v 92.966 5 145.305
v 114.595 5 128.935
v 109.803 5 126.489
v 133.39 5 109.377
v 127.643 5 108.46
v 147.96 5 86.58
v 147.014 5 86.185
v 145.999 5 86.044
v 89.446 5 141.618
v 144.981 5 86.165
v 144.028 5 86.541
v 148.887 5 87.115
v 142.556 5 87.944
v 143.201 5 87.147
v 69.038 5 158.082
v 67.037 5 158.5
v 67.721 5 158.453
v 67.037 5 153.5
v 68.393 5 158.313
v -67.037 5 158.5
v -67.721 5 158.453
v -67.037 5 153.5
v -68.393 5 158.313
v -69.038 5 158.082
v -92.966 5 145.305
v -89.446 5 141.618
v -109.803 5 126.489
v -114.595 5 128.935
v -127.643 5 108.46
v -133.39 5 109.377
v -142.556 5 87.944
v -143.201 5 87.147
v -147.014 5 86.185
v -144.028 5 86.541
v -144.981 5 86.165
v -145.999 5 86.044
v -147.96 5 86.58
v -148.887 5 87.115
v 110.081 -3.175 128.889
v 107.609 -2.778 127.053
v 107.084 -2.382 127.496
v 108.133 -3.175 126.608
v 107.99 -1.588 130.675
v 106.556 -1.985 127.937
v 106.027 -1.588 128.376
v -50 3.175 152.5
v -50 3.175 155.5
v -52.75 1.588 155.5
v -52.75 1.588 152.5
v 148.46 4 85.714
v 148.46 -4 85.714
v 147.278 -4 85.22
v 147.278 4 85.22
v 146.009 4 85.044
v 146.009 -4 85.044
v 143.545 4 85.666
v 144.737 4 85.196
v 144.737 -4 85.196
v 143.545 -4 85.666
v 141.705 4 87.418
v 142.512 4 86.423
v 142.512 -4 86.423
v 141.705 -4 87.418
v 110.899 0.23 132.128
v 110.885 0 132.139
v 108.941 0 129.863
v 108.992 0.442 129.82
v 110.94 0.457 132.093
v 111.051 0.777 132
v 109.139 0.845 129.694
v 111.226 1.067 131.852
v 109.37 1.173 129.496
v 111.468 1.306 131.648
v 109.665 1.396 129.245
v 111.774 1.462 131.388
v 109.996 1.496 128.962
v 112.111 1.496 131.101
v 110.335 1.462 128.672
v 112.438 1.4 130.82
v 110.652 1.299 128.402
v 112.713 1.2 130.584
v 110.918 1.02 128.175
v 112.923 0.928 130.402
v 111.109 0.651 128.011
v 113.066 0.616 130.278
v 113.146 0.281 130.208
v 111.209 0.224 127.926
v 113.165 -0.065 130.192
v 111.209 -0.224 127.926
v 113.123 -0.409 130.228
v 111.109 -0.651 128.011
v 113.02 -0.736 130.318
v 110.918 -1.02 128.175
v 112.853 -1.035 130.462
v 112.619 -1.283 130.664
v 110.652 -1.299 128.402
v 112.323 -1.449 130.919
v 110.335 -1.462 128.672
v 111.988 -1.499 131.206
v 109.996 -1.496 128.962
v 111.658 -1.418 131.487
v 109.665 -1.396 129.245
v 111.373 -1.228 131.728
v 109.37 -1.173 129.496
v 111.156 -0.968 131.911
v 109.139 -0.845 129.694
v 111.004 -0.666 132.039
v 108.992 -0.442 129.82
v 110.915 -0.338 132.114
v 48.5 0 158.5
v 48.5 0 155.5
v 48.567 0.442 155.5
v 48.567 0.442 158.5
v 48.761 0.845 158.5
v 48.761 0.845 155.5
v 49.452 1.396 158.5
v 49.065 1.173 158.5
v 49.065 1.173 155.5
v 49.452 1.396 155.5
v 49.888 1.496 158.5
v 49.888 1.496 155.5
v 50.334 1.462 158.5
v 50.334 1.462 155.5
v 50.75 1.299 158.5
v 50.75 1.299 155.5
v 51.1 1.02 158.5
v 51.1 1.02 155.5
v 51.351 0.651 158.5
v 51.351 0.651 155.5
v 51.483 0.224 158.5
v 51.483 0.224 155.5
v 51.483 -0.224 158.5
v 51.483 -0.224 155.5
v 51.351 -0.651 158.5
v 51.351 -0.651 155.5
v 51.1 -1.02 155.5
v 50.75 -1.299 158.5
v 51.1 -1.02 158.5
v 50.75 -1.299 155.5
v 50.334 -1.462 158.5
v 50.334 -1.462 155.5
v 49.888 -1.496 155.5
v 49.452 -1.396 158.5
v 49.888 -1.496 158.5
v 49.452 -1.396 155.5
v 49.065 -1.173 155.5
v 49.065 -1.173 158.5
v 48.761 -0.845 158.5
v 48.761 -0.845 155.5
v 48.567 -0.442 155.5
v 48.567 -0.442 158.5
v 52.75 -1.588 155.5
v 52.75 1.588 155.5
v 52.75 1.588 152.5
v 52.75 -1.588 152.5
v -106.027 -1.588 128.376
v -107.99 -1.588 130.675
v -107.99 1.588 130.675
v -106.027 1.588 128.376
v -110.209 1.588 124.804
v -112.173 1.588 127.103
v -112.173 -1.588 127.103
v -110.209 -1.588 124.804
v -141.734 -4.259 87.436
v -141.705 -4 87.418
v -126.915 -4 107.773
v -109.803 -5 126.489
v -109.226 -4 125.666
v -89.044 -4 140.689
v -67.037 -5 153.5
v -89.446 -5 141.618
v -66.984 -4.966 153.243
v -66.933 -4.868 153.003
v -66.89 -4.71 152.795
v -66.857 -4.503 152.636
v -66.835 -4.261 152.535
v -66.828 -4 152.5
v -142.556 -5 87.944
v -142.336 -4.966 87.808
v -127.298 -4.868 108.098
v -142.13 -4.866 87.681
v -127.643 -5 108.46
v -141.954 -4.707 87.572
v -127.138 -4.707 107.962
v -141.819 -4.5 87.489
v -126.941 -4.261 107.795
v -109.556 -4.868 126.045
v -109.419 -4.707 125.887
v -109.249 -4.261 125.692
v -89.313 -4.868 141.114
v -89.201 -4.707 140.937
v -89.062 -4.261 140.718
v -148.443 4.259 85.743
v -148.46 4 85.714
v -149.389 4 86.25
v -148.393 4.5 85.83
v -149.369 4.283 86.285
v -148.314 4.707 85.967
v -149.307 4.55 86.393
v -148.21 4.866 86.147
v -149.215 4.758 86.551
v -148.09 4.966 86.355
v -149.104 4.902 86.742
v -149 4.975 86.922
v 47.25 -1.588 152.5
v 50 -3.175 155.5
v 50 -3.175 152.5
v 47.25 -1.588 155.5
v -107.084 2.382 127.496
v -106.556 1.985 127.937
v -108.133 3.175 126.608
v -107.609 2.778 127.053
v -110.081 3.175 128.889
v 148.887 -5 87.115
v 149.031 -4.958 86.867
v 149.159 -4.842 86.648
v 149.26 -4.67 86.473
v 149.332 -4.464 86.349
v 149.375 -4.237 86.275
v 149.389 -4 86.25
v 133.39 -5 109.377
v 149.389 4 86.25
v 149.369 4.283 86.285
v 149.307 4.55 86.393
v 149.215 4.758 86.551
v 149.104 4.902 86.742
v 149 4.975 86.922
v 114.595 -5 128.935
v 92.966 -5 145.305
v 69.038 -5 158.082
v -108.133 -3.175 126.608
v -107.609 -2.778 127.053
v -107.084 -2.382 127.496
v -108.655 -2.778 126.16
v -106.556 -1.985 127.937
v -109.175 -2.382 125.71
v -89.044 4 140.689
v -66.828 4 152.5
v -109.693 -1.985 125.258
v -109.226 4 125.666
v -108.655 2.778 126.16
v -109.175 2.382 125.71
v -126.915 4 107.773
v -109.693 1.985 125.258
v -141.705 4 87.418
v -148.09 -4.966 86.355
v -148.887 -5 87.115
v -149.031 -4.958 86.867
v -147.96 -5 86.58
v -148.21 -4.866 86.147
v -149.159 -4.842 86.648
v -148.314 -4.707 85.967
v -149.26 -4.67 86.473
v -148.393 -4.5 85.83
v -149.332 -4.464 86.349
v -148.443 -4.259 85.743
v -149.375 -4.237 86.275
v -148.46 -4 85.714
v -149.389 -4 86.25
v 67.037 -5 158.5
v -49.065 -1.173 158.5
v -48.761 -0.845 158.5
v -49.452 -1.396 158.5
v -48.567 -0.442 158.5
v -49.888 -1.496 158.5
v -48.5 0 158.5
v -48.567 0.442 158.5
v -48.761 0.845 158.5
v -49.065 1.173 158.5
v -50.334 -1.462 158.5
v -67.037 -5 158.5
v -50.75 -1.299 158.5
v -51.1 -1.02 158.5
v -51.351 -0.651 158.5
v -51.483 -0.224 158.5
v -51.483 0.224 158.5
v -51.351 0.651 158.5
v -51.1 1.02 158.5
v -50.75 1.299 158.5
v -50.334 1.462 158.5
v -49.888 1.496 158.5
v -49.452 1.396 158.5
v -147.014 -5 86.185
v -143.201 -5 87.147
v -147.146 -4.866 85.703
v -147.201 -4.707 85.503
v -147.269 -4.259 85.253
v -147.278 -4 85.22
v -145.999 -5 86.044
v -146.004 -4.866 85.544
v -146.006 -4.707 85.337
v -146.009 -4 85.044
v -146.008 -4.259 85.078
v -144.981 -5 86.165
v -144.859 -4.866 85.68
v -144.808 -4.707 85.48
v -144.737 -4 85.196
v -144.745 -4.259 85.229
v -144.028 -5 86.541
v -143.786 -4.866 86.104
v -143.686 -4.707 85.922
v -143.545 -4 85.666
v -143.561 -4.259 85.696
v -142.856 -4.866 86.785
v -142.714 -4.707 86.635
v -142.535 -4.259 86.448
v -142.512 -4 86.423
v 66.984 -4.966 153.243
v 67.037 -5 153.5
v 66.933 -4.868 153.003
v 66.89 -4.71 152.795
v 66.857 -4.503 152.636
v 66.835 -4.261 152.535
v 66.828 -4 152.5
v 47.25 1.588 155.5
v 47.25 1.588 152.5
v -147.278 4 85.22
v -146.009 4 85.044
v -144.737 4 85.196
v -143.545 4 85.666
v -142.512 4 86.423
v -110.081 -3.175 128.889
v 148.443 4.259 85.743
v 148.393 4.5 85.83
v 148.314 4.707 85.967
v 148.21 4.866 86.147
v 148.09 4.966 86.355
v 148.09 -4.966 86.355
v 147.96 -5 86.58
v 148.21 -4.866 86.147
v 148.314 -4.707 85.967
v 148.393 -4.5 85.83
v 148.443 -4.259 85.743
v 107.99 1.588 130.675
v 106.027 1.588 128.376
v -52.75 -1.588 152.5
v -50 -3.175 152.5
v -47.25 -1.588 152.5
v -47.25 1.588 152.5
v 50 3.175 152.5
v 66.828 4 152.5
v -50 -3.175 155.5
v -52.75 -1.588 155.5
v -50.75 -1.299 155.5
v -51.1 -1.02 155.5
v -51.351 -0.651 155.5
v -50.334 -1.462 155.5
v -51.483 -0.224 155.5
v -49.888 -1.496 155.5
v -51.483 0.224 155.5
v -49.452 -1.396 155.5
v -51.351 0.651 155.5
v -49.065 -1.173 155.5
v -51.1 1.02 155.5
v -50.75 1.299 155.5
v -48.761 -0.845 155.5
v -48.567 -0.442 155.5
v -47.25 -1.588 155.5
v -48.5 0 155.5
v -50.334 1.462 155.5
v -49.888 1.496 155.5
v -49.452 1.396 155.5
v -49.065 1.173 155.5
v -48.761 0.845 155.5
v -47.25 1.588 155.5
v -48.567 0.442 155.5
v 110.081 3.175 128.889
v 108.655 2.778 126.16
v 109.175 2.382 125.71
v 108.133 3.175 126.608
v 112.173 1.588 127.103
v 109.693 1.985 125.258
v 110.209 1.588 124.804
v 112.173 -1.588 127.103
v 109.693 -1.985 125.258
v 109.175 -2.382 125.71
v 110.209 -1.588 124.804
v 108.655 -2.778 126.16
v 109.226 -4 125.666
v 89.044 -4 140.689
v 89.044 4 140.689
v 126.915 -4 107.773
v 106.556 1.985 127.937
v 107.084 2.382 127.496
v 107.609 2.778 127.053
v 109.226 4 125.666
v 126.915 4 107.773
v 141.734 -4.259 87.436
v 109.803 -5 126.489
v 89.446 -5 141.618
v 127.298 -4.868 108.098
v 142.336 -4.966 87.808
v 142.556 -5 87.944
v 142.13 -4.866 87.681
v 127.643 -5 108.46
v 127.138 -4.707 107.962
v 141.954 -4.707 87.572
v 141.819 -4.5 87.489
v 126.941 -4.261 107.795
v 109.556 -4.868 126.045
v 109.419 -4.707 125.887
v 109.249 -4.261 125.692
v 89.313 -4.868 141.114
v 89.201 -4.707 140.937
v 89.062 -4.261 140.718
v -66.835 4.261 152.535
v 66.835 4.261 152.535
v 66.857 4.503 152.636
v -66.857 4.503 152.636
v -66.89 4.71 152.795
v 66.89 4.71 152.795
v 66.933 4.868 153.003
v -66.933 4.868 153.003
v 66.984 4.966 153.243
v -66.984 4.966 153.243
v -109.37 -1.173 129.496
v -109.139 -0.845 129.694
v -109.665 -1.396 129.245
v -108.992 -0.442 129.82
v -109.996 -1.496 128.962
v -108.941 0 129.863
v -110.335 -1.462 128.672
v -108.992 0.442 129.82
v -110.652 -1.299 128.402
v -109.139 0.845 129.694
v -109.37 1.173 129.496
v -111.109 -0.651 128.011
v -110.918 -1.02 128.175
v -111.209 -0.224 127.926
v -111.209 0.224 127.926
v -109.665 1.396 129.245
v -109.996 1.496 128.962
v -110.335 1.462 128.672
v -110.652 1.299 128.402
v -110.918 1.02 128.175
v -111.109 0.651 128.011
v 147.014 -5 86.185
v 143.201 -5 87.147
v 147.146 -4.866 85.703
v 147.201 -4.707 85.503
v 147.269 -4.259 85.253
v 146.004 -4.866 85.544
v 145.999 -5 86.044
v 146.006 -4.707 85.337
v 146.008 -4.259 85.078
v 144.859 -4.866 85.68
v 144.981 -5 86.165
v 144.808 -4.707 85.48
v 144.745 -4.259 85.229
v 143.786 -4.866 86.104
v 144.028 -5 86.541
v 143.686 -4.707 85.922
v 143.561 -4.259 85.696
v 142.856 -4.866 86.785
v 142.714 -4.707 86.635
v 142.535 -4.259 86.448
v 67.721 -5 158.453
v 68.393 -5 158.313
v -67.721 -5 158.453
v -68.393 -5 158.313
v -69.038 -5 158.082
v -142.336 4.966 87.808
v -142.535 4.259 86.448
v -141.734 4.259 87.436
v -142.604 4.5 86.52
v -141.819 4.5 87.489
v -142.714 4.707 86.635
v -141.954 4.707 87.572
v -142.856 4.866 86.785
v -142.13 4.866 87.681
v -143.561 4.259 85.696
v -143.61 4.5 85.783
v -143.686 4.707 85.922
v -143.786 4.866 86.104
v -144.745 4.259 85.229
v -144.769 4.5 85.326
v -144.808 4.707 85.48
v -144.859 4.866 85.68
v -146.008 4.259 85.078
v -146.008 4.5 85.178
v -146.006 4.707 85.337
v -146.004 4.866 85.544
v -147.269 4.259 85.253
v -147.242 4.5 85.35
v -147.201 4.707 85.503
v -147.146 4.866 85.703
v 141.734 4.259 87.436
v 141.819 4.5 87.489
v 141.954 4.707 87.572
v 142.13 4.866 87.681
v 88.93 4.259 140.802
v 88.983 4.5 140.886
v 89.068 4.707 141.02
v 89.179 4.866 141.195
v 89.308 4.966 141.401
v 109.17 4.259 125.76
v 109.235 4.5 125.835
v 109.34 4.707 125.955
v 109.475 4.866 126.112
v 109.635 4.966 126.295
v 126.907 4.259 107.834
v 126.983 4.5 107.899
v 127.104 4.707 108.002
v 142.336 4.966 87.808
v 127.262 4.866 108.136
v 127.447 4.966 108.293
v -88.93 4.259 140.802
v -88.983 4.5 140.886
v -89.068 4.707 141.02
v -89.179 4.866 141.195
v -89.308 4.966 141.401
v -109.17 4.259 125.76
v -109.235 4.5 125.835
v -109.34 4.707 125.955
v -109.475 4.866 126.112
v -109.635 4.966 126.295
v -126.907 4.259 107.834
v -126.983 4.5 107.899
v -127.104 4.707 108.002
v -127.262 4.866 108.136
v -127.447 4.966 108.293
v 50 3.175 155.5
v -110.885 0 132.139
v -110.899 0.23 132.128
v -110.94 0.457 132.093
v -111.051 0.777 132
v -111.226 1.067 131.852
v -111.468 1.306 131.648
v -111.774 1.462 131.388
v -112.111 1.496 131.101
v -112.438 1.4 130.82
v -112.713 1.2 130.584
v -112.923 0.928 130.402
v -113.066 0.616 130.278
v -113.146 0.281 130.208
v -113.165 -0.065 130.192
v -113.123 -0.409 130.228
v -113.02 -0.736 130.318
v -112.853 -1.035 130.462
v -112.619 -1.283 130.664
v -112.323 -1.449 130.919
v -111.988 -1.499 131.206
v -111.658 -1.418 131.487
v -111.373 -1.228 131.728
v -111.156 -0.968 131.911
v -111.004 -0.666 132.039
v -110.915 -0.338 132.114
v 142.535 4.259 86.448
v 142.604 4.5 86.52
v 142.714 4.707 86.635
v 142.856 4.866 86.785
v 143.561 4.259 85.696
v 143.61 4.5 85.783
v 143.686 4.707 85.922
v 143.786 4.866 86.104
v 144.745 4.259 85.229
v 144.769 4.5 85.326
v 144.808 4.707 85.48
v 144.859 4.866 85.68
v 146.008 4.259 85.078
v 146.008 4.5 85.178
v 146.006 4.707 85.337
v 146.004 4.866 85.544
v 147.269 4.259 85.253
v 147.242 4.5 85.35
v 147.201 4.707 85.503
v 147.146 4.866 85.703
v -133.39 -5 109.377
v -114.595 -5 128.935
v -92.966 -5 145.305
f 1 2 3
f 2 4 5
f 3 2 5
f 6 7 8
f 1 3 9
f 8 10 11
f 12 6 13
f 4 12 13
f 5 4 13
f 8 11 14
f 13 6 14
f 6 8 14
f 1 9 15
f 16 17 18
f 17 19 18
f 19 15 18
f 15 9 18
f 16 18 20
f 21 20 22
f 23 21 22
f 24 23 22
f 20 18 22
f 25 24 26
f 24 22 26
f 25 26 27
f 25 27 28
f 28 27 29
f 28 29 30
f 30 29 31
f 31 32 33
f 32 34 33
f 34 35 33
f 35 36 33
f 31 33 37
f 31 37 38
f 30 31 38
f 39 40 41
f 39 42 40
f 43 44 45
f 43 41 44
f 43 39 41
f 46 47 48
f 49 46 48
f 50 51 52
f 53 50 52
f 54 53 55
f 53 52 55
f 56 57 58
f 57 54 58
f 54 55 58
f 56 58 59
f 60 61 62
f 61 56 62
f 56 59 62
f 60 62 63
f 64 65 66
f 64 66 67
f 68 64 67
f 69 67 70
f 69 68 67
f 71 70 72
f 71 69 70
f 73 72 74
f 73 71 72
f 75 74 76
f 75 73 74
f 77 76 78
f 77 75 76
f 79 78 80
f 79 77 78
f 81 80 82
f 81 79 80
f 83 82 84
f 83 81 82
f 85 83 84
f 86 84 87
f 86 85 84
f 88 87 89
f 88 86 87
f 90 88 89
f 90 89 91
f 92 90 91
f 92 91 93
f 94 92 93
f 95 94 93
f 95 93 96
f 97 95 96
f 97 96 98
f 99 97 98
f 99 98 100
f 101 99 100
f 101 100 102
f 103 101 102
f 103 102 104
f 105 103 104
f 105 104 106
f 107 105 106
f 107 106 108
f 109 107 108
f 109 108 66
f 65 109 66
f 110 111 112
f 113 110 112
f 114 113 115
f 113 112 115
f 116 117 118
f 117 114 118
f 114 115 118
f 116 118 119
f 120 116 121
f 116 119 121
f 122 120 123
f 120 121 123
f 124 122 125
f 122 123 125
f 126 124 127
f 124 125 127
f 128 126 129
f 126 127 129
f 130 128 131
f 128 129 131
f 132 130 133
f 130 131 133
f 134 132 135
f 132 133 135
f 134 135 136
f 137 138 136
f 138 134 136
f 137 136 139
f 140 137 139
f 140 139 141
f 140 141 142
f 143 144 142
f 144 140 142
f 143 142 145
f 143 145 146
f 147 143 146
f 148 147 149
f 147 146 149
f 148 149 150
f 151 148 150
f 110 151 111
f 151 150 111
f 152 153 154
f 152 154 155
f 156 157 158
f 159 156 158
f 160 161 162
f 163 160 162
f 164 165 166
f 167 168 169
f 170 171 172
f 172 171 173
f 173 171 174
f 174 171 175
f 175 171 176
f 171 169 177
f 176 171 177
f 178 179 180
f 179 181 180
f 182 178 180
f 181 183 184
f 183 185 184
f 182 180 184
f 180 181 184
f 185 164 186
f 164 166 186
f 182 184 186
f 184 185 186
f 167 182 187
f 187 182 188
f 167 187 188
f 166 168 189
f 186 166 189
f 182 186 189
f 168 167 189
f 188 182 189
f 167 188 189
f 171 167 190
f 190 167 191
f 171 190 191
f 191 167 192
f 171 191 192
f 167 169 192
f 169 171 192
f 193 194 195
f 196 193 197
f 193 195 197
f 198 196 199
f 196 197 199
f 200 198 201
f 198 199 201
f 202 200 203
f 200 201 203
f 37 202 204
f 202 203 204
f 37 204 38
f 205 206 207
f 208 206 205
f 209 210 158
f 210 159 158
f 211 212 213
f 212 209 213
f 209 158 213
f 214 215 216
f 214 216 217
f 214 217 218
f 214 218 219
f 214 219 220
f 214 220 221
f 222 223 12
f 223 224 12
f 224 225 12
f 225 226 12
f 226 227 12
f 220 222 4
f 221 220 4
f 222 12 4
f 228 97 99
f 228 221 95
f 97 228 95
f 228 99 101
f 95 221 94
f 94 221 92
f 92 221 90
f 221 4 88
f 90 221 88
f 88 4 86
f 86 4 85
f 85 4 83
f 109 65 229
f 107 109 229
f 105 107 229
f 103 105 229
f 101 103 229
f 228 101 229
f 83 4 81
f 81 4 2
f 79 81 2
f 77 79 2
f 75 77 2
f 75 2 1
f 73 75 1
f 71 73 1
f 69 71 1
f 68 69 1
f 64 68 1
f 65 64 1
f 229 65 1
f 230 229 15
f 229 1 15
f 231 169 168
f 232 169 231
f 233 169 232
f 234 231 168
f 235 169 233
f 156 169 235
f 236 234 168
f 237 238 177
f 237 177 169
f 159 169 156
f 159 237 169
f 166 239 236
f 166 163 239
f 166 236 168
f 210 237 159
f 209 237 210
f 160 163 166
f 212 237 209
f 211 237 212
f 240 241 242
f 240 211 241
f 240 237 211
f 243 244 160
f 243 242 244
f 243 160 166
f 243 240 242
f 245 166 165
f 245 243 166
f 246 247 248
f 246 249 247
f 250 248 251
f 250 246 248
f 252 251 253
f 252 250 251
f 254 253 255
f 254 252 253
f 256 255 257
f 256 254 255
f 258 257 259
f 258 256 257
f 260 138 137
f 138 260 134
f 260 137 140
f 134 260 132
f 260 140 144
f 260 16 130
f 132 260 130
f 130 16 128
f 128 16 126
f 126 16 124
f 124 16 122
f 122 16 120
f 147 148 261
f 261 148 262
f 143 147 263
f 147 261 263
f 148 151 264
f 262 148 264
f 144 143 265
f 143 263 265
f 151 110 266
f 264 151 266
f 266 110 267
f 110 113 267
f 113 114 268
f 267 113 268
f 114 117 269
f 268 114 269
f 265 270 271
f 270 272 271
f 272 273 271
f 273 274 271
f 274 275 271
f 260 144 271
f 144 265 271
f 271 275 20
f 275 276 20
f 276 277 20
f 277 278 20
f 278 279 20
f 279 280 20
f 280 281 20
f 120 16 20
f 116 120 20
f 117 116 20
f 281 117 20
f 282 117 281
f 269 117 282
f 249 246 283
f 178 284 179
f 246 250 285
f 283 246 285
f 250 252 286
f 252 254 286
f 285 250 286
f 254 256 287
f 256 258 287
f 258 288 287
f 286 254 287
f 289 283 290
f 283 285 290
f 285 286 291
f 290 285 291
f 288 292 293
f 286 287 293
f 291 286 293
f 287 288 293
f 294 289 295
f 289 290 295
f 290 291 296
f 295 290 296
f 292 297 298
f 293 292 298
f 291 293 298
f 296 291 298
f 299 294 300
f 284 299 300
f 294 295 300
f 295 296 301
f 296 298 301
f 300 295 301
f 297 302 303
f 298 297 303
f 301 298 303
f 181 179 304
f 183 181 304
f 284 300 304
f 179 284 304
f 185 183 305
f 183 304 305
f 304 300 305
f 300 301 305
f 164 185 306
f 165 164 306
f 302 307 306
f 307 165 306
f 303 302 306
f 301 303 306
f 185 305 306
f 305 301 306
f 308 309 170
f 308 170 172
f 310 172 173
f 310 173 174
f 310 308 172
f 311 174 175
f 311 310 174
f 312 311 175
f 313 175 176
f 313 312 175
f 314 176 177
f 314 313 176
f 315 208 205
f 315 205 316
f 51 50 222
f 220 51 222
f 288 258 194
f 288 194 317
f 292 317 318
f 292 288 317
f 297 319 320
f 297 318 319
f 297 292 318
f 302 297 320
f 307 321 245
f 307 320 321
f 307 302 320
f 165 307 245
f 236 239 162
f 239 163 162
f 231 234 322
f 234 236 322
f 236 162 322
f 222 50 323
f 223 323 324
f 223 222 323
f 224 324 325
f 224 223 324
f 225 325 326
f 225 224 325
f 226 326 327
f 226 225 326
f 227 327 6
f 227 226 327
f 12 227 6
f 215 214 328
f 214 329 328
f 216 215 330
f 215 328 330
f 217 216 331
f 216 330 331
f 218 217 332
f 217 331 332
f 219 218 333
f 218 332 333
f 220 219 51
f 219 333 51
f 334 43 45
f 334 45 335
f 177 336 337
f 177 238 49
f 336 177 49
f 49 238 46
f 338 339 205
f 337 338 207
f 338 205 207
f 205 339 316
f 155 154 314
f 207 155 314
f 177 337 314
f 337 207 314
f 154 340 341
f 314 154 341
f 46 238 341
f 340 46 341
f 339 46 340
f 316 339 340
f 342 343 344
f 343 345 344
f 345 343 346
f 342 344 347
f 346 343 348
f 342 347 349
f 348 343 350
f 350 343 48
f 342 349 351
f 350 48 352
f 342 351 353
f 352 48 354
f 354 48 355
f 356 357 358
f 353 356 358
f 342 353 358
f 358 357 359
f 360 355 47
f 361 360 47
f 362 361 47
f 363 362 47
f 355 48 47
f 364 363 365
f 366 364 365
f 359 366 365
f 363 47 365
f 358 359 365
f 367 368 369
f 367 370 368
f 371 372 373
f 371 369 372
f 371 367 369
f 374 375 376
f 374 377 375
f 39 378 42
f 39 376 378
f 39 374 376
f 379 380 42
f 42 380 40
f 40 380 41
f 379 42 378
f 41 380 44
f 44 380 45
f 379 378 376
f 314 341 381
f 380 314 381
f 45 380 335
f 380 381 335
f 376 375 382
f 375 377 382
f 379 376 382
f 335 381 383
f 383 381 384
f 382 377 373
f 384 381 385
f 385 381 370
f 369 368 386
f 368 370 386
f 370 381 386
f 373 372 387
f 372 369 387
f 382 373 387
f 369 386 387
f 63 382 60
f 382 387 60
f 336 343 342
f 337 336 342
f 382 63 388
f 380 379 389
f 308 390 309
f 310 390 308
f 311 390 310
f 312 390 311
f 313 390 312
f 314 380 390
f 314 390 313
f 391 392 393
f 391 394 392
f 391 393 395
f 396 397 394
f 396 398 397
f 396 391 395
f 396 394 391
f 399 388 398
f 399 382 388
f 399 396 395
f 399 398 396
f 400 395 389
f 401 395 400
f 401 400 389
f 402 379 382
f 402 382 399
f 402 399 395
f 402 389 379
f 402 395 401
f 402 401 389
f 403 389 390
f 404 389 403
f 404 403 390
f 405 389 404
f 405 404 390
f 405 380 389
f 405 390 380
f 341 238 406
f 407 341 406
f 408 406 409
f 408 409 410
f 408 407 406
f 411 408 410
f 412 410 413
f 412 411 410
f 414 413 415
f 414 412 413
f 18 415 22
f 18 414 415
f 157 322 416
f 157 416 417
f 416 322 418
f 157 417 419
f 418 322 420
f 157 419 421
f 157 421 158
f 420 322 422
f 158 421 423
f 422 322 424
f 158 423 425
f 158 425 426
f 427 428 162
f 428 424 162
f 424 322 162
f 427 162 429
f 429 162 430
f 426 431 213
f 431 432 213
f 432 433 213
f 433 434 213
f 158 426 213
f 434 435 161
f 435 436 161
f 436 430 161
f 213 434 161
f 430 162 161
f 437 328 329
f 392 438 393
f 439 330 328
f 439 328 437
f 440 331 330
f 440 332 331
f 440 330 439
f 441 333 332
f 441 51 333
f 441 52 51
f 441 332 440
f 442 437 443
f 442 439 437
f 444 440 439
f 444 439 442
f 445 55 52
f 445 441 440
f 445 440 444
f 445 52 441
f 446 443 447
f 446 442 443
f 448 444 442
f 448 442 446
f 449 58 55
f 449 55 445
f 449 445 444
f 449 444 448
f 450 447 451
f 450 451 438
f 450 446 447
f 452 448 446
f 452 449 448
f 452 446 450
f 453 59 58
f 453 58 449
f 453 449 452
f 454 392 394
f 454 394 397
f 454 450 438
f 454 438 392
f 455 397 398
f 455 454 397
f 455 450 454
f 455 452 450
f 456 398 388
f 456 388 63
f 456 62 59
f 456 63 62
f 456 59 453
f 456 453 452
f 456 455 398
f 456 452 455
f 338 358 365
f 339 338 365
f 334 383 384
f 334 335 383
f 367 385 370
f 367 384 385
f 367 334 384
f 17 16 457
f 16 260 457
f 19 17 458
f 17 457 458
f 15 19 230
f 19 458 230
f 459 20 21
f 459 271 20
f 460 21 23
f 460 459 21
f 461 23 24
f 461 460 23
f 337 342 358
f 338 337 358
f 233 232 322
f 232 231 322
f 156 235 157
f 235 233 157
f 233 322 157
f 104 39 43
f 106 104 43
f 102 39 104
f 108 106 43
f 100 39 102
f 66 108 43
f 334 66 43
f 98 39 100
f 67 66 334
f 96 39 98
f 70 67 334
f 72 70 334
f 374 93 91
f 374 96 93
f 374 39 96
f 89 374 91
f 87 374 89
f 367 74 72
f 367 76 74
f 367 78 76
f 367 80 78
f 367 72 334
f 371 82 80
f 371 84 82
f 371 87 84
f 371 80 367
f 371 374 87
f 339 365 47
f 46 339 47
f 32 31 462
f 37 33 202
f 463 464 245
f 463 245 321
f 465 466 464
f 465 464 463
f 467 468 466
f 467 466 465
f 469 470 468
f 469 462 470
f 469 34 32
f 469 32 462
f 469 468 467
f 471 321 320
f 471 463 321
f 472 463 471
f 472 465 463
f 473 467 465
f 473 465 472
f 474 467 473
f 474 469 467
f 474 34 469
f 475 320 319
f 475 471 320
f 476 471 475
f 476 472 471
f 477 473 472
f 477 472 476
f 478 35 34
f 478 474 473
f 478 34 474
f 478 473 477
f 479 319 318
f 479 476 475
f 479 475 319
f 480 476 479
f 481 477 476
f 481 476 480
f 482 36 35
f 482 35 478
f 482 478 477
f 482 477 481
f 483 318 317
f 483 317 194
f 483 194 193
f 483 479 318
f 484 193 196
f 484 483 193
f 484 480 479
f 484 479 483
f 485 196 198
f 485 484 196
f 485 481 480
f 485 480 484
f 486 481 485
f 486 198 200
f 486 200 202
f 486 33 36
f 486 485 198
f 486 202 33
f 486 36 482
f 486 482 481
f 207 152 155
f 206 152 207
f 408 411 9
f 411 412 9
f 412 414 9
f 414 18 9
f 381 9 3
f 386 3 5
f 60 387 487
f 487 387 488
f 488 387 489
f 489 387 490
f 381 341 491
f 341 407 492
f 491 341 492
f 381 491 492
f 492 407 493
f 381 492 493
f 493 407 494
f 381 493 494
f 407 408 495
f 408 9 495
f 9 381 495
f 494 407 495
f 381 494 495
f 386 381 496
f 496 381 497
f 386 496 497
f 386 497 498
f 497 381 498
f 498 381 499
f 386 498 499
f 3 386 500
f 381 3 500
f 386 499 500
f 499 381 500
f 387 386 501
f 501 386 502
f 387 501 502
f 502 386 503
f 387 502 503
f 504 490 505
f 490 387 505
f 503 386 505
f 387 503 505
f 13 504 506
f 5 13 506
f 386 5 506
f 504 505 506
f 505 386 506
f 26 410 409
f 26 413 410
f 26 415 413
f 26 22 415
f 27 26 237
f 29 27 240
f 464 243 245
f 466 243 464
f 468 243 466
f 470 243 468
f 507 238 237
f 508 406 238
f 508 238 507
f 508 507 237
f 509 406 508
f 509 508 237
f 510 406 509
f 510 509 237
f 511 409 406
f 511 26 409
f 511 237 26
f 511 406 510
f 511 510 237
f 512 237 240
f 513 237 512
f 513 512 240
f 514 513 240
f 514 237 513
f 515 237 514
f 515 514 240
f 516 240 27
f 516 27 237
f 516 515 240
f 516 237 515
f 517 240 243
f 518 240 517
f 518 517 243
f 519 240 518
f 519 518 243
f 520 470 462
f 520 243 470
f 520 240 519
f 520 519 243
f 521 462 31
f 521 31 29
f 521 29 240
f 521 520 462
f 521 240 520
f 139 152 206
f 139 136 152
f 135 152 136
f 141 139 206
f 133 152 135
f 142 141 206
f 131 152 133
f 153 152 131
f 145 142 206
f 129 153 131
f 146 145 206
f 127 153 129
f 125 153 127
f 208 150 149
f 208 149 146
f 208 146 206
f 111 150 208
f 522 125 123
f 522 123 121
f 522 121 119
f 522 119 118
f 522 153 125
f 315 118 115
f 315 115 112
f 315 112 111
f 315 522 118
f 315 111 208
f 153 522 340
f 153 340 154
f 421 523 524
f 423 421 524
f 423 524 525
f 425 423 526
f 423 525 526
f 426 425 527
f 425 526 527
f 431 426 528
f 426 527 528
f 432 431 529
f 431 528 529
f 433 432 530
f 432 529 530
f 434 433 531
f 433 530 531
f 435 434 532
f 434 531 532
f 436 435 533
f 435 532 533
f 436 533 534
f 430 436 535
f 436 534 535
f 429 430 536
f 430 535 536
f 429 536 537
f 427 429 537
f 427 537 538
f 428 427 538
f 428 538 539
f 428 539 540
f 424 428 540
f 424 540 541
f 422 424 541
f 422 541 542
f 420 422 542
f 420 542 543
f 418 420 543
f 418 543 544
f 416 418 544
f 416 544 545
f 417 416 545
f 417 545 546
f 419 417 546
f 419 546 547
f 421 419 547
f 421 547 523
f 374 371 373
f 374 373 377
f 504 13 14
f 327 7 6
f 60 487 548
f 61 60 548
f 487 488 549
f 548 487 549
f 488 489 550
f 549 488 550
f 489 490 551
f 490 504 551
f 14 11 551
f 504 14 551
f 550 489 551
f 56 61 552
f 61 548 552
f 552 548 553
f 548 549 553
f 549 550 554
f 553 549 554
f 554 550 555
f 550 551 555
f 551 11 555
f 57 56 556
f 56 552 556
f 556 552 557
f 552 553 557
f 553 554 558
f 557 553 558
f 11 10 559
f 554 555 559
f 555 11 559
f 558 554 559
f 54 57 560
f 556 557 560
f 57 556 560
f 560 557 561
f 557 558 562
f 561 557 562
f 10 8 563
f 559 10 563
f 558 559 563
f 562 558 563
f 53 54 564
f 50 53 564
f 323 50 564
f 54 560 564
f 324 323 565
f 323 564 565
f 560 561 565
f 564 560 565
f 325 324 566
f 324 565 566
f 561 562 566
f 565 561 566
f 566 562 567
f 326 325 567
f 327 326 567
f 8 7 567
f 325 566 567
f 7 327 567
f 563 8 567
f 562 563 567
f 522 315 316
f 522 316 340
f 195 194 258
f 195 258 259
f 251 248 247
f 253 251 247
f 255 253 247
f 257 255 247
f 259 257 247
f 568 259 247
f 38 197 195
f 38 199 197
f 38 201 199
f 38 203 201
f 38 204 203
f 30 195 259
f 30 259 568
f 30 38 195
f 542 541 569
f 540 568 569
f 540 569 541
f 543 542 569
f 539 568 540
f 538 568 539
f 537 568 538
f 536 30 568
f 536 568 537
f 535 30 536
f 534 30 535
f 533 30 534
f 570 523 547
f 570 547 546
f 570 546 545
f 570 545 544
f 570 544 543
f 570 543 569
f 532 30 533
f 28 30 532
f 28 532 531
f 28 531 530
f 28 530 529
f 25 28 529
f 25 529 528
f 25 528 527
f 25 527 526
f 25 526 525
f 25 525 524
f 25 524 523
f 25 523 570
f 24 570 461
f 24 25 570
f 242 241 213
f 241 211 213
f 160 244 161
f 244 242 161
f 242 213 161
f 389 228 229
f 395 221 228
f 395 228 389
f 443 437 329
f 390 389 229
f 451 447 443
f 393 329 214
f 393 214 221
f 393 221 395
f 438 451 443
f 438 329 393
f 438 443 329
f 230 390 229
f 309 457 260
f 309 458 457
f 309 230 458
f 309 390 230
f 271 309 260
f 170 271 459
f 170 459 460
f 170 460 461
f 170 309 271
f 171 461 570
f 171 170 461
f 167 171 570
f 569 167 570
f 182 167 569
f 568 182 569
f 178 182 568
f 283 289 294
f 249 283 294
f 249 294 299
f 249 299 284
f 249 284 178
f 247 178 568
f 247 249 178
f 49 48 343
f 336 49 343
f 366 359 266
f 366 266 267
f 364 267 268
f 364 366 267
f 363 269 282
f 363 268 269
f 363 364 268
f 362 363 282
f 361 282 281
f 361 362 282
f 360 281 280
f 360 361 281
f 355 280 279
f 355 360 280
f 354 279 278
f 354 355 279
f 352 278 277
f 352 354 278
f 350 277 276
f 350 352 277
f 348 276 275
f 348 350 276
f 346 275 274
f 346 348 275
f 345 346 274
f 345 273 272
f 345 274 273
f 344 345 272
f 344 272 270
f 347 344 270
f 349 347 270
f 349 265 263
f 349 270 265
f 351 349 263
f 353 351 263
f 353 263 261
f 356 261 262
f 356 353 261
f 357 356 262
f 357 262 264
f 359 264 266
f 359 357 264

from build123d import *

# Parameters (mm, degrees)
BOSS_EXTRU_1_DEPTH       = 5
BOSS_EXTRU_1_DEPTH_BACK  = 5
ENL_V_MAT_EXTRU_10_DEPTH = 231.054341407
ENL_V_MAT_EXTRU_11_DEPTH = 228.935297837
CONG_1_R                 = 5
ESQUISSE16_R             = 1.5
ENL_V_MAT_EXTRU_13_DEPTH = 218.86334593
ESQUISSE17_R             = 1.5
ENL_V_MAT_EXTRU_14_DEPTH = 122.257222097
ENL_V_START              = -3
ENL_V_MAT_EXTRU_15_DEPTH = 119.257222101
ENL_V_MAT_EXTRU_16_DEPTH = 164.547347768
CONG_2_R                 = 1


with BuildPart() as part:
    # Esquisse1 → Boss.-Extru.1 (new, two sides: drawn at the far end of the back side and taken through both)
    with BuildSketch(Plane(origin=(0, 0, 0), x_dir=(1, 0, 0), z_dir=(0, 1, 0)).offset(-BOSS_EXTRU_1_DEPTH_BACK)):
        with BuildLine():
            Line((0, 49), (165, 49))
            Line((165, 49), (165, -55.235857919))
            ThreePointArc((165, -55.235857919), (127.908511428, -117.963607542), (68.381283989, -160))
            Line((68.381283989, -160), (0, -160))
            Line((0, -160), (0, 49))
        make_face()
    extrude(amount=BOSS_EXTRU_1_DEPTH + BOSS_EXTRU_1_DEPTH_BACK)

    # Symétrie1: part across plane


with BuildPart() as part_1:
    add(part.part)
    add(part.part.mirror(Plane(origin=(0, -5, -49), x_dir=(0, 0, 1), z_dir=(-1, 0, 0))))

    # Esquisse12 → Enlèv. mat.-Extru.10 (cut, through all)
    with BuildSketch(Plane(origin=(0, 5, 0), x_dir=(1, 0, 0), z_dir=(0, 1, 0))):
        with BuildLine():
            Line((165, 49), (-165, 49))
            Line((-165, 49), (-165, -55.235857919))
            ThreePointArc((-165, -55.235857919), (-127.908511428, -117.963607542), (-68.381283989, -160))
            Line((-68.381283989, -160), (68.381283989, -160))
            ThreePointArc((68.381283989, -160), (127.908511428, -117.963607542), (165, -55.235857919))
            Line((165, -55.235857919), (165, 49))
        make_face()
        with BuildLine():
            Line((163.5, 47.5), (-163.5, 47.5))
            Line((-163.5, 47.5), (-163.5, -54.990908339))
            ThreePointArc((-163.5, -54.990908339), (-126.827060587, -116.923678966), (-68.0734897, -158.5))
            Line((-68.0734897, -158.5), (68.0734897, -158.5))
            ThreePointArc((68.0734897, -158.5), (126.827060587, -116.923678966), (163.5, -54.990908339))
            Line((163.5, -54.990908339), (163.5, 47.5))
        make_face(mode=Mode.SUBTRACT)
    extrude(amount=-ENL_V_MAT_EXTRU_10_DEPTH, mode=Mode.SUBTRACT)

    # Esquisse13 → Enlèv. mat.-Extru.11 (cut, through all)
    with BuildSketch(Plane(origin=(0, 5, 0), x_dir=(1, 0, 0), z_dir=(0, 1, 0))):
        with BuildLine():
            Line((-163.5, 47.5), (163.5, 47.5))
            Line((163.5, 47.5), (163.5, -158.5))
            Line((163.5, -158.5), (0, -158.5))
            Line((0, -158.5), (0, -152.5))
            Line((0, -152.5), (-66.828137786, -152.5))
            ThreePointArc((-66.828137786, -152.5), (-111.046814507, -124.059884684), (-144.19322973, -83.25))
            Line((-144.19322973, -83.25), (-163.5, -94.396769013))
            Line((-163.5, -94.396769013), (-163.5, 47.5))
        make_face()
    extrude(amount=-ENL_V_MAT_EXTRU_11_DEPTH, mode=Mode.SUBTRACT)

    # Congé1
    cong_1_edges = [part_1.edges().sort_by_distance(p)[0] for p in [
        (-68.0734897, 0, 158.5),
        (-144.19322973, 0, 83.25),
    ]]
    fillet(cong_1_edges, radius=CONG_1_R)

    # Esquisse16 → Enlèv. mat.-Extru.13 (cut, through all)
    with BuildSketch(Plane.XY):
        with Locations((-50, 0)):
            Circle(ESQUISSE16_R)
    extrude(amount=ENL_V_MAT_EXTRU_13_DEPTH, mode=Mode.SUBTRACT)

    # Esquisse17 → Enlèv. mat.-Extru.14 (cut, through all)
    with BuildSketch(Plane(origin=(-112.029788337, 0, 131.170029066), x_dir=(0, 1, 0), z_dir=(-0.6494480483301822, 0, 0.7604059656000322))):
        Circle(ESQUISSE17_R)
    extrude(amount=-ENL_V_MAT_EXTRU_14_DEPTH, mode=Mode.SUBTRACT)

    # Esquisse18 → Enlèv. mat.-Extru.15 (cut, through all)
    with BuildSketch(Plane(origin=(-112.029788337, 0, 131.170029066), x_dir=(0, 1, 0), z_dir=(-0.6494480483301822, 0, 0.7604059656000322)).offset(ENL_V_START)):
        Polygon((3.175426481, 0), (1.58771324, 2.75), (-1.58771324, 2.75), (-3.175426481, 0), (-1.58771324, -2.75), (1.58771324, -2.75), align=None)
    extrude(amount=-ENL_V_MAT_EXTRU_15_DEPTH, mode=Mode.SUBTRACT)

    # Esquisse19 → Enlèv. mat.-Extru.16 (cut, through all)
    with BuildSketch(Plane.XY.offset(158.5).offset(ENL_V_START)):
        Polygon((-47.25, -1.58771324), (-47.25, 1.58771324), (-50, 3.175426481), (-52.75, 1.58771324), (-52.75, -1.58771324), (-50, -3.175426481), align=None)
    extrude(amount=-ENL_V_MAT_EXTRU_16_DEPTH, mode=Mode.SUBTRACT)

    # Congé2
    cong_2_edges = [part_1.edges().sort_by_distance(p)[0] for p in [
        (-109.226367496, -5, 125.665630319),
        (-144.736674491, -5, 85.195693901),
        (-109.226367496, 5, 125.665630319),
        (-144.736674491, 5, 85.195693901),
        (-148.924802049, -5, 85.981774552),
        (-148.924802049, 5, 85.981774552),
        (-33.414068893, -5, 152.5),
        (-33.414068893, 5, 152.5),
    ]]
    fillet(cong_2_edges, radius=CONG_2_R)

    # Symétrie2: part across plane


with BuildPart() as part_2:
    add(part_1.part)
    add(part_1.part.mirror(Plane(origin=(0, -5, 152.5), x_dir=(0, 0, 1), z_dir=(-1, 0, 0))))


solid = part_2.part
